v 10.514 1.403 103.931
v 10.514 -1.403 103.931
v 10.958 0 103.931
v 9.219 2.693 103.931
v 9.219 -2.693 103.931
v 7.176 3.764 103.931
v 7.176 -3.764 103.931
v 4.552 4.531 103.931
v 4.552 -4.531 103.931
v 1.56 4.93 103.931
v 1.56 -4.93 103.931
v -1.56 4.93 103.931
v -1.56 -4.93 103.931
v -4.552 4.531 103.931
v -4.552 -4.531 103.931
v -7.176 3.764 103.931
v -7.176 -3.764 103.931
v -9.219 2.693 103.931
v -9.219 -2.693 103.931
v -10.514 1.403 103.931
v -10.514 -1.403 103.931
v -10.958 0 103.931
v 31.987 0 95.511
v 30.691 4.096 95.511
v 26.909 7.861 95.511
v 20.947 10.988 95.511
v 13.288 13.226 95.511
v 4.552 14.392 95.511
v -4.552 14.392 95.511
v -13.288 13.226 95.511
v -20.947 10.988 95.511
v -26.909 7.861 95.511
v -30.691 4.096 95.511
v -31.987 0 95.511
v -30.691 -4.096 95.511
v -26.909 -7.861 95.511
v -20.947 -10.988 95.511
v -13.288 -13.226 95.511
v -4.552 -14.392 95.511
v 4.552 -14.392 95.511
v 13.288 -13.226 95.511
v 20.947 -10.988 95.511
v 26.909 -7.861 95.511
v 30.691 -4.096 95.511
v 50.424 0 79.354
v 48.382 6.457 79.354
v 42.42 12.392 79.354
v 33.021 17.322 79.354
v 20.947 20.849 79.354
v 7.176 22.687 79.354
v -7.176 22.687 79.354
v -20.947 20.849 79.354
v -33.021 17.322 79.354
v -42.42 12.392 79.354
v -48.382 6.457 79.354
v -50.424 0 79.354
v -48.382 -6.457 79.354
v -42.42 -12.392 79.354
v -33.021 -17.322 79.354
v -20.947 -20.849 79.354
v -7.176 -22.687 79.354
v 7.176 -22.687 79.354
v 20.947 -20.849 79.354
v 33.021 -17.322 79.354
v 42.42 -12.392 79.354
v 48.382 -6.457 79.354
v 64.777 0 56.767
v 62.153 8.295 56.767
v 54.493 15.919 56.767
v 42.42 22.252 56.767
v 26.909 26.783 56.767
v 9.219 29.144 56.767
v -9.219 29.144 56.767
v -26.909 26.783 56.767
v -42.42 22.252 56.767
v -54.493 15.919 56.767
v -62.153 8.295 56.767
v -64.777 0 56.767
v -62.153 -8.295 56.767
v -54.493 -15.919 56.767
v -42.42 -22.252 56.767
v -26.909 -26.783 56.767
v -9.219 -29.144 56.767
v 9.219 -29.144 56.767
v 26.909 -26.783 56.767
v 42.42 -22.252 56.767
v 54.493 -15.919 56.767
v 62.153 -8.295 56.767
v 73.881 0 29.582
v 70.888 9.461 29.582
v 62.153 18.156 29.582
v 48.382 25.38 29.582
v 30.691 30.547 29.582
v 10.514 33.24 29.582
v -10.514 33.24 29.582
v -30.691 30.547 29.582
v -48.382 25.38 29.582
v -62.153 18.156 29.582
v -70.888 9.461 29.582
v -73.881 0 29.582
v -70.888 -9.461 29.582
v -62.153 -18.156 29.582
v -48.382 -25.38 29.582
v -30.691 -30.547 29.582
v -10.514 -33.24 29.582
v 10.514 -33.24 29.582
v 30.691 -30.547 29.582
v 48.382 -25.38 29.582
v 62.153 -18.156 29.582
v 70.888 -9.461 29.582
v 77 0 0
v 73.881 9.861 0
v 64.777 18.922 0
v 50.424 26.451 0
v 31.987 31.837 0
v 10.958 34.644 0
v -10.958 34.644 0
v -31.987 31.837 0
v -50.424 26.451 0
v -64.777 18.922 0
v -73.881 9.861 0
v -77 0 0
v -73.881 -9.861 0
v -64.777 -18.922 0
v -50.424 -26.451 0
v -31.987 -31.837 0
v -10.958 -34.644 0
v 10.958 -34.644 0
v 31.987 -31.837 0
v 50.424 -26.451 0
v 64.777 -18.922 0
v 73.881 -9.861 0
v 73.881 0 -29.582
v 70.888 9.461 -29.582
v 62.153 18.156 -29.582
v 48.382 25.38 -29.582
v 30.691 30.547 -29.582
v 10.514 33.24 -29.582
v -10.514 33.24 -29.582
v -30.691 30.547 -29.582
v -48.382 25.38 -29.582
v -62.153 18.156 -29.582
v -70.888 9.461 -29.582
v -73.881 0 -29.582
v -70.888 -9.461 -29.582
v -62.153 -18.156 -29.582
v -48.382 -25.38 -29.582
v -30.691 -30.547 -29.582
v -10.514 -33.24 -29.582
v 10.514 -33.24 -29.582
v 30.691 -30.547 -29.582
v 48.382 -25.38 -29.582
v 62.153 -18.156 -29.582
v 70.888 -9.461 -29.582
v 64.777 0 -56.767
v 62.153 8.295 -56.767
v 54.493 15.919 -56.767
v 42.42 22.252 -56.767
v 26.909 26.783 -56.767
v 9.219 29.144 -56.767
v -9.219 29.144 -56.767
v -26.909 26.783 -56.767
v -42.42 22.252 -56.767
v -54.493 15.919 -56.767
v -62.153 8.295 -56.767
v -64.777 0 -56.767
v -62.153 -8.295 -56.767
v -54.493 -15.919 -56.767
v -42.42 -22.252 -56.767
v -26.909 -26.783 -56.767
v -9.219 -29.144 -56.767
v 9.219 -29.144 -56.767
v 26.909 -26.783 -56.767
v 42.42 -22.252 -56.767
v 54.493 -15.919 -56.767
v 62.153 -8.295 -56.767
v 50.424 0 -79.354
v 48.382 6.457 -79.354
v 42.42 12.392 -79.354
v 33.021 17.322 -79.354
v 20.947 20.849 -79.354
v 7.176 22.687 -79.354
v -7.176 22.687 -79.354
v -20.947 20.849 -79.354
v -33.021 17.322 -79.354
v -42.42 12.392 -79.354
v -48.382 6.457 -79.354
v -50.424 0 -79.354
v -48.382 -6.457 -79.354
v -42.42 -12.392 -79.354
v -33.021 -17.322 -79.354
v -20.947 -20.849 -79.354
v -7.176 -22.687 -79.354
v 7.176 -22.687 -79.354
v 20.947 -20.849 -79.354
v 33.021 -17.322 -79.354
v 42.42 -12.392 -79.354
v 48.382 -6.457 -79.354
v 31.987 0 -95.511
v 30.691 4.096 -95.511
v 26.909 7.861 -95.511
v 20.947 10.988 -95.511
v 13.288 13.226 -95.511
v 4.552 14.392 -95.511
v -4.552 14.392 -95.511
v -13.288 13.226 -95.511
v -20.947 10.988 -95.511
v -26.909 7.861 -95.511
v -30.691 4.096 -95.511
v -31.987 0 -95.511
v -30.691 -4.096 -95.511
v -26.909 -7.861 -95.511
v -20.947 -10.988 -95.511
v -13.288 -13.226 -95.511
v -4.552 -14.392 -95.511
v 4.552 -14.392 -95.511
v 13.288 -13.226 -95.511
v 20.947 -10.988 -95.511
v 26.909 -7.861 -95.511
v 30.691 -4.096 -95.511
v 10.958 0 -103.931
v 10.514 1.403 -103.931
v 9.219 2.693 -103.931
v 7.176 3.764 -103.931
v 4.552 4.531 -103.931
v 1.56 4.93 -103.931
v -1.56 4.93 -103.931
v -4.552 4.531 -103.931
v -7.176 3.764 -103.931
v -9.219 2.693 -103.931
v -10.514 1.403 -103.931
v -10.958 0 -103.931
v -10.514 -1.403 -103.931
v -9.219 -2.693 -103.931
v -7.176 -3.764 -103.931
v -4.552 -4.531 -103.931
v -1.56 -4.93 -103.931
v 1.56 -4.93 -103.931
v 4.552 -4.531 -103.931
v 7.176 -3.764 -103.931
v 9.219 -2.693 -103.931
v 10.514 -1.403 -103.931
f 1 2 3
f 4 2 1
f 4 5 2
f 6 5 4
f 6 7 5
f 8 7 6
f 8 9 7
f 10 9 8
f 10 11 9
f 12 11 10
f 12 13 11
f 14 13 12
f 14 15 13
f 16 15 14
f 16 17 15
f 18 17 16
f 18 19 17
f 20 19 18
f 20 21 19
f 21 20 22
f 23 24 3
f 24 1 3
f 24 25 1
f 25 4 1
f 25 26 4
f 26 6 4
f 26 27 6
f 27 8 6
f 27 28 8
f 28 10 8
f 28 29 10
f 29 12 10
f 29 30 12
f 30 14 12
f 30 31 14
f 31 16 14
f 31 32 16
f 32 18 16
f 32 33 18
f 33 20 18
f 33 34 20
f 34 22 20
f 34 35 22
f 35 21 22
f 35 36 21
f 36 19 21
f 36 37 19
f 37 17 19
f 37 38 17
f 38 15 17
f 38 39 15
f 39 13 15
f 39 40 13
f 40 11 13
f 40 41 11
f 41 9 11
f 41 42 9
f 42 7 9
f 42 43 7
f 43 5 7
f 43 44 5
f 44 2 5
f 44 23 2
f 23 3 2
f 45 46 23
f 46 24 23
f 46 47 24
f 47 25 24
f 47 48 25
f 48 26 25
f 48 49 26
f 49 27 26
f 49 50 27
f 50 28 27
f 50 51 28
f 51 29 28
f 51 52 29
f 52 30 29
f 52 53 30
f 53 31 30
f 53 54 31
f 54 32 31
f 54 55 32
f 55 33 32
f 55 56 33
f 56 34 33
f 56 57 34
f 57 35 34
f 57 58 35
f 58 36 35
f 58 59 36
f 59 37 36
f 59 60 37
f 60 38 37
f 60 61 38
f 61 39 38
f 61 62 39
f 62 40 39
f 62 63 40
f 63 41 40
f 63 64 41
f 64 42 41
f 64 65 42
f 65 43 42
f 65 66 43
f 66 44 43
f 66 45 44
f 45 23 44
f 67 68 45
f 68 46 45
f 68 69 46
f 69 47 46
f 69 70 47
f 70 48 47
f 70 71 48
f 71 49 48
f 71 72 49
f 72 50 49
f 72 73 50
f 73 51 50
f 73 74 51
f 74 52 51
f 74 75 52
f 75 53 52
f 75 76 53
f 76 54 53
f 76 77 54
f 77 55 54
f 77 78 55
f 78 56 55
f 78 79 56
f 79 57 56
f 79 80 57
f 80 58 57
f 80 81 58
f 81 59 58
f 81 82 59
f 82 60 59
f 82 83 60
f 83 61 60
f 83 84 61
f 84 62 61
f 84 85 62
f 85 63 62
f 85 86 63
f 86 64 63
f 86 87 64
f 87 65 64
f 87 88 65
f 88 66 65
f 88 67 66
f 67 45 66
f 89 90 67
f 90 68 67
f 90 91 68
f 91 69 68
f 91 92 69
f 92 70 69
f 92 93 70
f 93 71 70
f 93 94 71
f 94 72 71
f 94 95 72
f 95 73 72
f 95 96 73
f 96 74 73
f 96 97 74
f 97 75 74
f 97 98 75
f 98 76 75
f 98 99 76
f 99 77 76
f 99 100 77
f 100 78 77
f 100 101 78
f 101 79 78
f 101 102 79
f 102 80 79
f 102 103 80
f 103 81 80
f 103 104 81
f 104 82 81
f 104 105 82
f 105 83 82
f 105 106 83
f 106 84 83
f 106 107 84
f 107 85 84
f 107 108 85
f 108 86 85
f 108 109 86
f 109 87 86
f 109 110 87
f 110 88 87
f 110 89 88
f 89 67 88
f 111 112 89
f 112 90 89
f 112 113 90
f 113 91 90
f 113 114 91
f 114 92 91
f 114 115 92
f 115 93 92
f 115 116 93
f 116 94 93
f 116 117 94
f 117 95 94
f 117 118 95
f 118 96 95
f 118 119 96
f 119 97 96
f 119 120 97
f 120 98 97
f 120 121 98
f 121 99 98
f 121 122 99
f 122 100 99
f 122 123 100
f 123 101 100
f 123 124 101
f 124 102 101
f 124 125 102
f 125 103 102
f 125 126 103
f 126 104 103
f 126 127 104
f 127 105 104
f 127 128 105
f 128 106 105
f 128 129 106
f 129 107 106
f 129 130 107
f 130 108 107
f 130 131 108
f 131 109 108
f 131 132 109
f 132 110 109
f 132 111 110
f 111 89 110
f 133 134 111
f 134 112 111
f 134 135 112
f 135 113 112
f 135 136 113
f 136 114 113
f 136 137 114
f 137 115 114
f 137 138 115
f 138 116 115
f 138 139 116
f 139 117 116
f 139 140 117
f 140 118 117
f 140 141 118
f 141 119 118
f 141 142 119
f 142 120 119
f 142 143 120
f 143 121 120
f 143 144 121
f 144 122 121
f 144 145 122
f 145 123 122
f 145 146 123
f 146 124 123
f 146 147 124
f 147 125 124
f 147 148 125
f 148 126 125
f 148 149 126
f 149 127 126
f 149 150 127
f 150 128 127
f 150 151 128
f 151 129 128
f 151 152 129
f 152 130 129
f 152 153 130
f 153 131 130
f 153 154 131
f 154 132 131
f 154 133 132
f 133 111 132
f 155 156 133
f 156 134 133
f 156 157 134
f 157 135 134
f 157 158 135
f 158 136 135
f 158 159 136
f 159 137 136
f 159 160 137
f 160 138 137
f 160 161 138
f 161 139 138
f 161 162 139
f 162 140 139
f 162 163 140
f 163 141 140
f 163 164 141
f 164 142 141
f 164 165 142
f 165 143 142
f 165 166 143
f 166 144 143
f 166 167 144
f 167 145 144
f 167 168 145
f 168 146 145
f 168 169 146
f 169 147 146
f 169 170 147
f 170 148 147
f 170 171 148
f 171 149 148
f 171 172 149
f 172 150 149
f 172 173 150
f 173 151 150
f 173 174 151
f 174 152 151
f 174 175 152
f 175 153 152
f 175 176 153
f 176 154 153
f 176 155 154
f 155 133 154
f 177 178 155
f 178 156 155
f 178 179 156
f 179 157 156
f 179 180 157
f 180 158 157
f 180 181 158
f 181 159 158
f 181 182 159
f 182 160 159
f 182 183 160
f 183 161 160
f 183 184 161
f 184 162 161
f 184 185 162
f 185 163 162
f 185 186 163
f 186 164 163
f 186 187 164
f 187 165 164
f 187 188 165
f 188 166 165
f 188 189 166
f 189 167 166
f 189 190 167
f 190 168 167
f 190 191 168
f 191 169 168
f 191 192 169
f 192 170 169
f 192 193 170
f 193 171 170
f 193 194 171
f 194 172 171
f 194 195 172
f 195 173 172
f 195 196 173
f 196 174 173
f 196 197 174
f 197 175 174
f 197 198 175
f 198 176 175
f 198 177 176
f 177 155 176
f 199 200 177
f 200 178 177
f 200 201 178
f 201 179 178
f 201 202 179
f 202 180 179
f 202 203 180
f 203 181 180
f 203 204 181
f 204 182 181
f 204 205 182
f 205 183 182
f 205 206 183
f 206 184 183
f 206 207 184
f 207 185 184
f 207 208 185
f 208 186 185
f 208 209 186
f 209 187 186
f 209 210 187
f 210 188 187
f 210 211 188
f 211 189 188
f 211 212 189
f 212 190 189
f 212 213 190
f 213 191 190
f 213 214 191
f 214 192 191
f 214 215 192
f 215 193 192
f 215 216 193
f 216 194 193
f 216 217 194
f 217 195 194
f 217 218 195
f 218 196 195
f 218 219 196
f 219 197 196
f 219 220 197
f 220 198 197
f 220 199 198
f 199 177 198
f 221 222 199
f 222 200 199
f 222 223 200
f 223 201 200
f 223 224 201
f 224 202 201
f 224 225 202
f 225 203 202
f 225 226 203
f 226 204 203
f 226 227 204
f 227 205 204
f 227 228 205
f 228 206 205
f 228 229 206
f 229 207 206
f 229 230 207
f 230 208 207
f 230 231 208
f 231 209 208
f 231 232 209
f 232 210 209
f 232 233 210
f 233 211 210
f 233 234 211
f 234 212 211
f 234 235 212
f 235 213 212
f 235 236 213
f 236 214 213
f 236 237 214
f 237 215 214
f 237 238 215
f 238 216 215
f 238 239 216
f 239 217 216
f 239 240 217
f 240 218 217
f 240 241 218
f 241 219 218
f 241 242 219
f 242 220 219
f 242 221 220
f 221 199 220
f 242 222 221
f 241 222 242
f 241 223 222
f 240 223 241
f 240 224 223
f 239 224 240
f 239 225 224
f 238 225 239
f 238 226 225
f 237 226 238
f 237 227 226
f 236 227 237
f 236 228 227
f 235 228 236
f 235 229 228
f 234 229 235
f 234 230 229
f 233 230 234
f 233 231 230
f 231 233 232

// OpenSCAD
// Generated by SolidPython 1.0.1 on 2020-07-29 00:46:49


scale(v = [11, 5, 15]) {
	sphere(r = 7);
}
/***********************************************
*********      SolidPython code:      **********
************************************************
 
# import packages: SolidPython
from solid import *
from solid.utils import *
from itertools import chain, combinations, permutations


class Resize:

    def __init__(self, scad_file):
        self.scad_file = scad_file
        #self.scad_file = import_scad(scad_file)
        # cone/cylinder param:
        self.r1 = 0
        self.r2 = 0
        self.h = 0
        # rectangular prism param:
        self.w = 0
        self.l = 0
        # ellipse param:
        self.r = 0

    # import OpenScad code (file name corresponds to shape)


    # classify shape + parameters
    def assign(self, param1, param2, param3):
        if self.scad_file == 'cone.scad':
            self.r1 = param1
            self.r2 = param2
            self.h = param3
        elif self.scad_file == 'cylinder.scad':
            self.r1 = param1
            self.r2 = param2
            self.h = param3
        elif self.scad_file == 'rectangularPrism.scad':
            self.h = param1
            self.l = param2
            self.w = param3
        else:
            self.r = param1
            self.h = param2

    # resize parameters
    def iterate(self):
        x = range(3, 20, 2)
        i = 1
        if self.scad_file == 'cone.scad':
            tempList = list(permutations(x, 2))
            for temp in tempList:
                param1 = temp[0]
                param2 = temp[1]
                filepath = 'produced_scad_files/' + 'cone' + str(param1) + '_' + str(param2) + '_' + '.scad'
                scad_render_to_file(cylinder(h=param1, r1=param2, r2=0), filepath)

        elif self.scad_file == 'cylinder.scad':
            tempList = list(permutations(x, 3))
            for temp in tempList:
                param1 = temp[0]
                param2 = temp[1]
                filepath = 'produced_scad_files/' + 'cylinder' + str(param1) + '_' + str(param2) + '_' + '.scad'
                scad_render_to_file(cylinder(h=param1, r1=param2, r2=param2), filepath)

        elif self.scad_file == 'rectangularPrism.scad':
            tempList = list(permutations(x, 3))
            for temp in tempList:
                param1 = temp[0]
                param2 = temp[1]
                param3 = temp[2]
                filepath = 'produced_scad_files/' + 'rectangularPrism' + str(param1) + '_' + str(param2) + '_' + str(
                    param3) + '.scad'
                scad_render_to_file(cube(size=(param1, param2, param3)), filepath)

        elif self.scad_file == 'ellipse.scad':
            tempList = list(permutations(x, 4))
            for temp in tempList:
                param1 = temp[0]
                param2 = temp[1]
                param3 = temp[2]
                param4 = temp[3]
                filepath = 'produced_scad_files/' + 'ellipse' + str(param1) + '_' + str(param2) + '_' + str(param3) + '_' + str(param4) + '.scad'
                scad_render_to_file(scale([param1, param2, param3])(sphere(r=param4)), filepath)

    def render_to_scadfile(self):
        scad_render_to_file(scad, 'example.scad') 
 
************************************************/
